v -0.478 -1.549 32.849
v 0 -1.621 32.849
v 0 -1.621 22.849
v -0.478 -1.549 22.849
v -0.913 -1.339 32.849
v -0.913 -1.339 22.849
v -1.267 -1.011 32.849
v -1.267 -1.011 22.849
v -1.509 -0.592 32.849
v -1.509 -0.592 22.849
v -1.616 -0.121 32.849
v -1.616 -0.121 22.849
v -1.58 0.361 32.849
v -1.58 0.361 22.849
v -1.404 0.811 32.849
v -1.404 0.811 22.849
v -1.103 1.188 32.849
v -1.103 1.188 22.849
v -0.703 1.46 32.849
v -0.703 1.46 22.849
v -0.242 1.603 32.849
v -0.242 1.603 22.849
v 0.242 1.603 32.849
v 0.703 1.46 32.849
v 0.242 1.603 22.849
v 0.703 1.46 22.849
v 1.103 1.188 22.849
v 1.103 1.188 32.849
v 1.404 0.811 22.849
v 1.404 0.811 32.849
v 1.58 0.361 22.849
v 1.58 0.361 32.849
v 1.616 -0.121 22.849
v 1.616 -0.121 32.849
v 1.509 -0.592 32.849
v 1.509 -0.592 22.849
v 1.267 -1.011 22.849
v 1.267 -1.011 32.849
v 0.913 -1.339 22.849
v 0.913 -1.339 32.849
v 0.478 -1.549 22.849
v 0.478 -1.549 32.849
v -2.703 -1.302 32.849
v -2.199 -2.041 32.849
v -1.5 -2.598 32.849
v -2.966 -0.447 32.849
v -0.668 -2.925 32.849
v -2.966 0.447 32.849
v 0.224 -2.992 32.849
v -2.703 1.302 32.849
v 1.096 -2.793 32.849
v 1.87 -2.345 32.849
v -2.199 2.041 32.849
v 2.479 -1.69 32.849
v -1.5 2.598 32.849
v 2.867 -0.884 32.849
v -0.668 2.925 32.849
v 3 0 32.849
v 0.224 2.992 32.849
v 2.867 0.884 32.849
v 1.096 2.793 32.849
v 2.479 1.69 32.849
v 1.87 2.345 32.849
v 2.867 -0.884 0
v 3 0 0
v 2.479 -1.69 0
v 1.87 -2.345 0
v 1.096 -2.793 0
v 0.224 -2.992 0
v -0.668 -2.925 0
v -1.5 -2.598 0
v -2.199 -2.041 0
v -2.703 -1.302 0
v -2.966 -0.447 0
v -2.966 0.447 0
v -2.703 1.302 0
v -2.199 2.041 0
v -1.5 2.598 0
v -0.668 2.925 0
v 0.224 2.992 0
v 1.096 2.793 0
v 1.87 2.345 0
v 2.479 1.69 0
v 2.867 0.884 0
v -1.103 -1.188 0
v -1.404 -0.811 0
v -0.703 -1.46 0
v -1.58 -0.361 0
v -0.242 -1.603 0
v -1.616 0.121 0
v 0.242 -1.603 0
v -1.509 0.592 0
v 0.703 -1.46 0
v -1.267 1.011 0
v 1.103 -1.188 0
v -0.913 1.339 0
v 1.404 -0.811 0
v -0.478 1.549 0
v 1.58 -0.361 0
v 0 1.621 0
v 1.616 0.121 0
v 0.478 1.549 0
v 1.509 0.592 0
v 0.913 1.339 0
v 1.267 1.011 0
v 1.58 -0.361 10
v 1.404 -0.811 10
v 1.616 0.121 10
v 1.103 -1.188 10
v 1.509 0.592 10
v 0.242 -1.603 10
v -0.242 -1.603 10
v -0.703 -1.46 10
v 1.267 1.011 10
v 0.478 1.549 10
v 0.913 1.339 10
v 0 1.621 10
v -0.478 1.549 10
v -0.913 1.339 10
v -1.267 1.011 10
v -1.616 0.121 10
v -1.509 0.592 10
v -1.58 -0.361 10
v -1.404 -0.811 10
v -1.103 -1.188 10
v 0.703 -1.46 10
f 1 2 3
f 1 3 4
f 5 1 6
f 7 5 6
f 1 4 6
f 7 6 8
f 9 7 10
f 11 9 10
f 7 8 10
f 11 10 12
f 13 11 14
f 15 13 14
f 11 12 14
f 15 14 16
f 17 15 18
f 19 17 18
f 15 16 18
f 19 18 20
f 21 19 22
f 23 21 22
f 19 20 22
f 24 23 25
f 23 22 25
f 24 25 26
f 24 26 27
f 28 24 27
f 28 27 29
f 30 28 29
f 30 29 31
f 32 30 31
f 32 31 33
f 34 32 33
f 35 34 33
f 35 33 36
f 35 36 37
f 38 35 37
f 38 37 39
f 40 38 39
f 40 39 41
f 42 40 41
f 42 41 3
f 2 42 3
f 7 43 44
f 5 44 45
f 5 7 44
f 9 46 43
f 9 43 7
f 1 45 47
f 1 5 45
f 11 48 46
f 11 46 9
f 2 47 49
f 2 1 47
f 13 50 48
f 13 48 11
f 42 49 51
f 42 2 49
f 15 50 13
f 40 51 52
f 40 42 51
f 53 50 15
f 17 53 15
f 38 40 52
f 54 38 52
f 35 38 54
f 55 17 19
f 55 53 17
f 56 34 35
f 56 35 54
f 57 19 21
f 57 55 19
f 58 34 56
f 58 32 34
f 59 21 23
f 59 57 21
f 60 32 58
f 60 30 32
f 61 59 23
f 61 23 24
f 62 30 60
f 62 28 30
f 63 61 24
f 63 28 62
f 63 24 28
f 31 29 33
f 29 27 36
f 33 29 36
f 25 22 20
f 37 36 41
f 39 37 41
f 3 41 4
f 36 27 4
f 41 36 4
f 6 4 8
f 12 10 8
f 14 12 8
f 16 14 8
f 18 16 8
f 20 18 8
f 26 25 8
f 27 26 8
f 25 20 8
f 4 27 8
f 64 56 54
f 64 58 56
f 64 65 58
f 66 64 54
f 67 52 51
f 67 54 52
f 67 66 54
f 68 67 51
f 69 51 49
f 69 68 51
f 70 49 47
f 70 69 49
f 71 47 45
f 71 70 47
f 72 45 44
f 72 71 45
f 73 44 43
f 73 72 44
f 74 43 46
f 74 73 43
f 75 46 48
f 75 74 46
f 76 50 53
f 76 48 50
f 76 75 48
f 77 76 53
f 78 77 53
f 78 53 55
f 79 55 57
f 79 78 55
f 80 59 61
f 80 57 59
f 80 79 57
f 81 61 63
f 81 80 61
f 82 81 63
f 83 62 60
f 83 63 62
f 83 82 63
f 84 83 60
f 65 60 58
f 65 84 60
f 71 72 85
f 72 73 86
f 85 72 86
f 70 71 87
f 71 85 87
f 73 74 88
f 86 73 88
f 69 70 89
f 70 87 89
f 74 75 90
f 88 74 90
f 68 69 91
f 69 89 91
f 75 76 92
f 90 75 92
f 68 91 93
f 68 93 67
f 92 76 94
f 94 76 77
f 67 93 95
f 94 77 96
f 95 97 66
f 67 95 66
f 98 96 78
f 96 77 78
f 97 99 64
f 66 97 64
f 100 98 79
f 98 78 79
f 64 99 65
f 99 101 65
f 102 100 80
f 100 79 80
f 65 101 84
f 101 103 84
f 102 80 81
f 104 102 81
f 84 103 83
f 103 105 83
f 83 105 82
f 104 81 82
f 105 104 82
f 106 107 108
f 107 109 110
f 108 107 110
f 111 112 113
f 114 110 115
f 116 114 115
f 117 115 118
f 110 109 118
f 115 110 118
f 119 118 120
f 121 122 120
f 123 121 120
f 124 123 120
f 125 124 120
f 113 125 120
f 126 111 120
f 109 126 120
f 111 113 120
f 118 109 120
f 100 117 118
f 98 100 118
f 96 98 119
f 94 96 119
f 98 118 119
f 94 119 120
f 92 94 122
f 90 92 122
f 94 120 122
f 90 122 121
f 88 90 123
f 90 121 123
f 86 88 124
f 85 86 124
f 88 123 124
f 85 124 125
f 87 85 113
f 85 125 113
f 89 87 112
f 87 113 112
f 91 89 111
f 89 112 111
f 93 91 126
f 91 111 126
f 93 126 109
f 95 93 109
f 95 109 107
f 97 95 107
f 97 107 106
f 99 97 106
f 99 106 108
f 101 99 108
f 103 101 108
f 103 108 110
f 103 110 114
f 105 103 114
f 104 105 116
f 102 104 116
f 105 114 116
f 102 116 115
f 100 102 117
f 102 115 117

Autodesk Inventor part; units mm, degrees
ref_plane "YZ Plane" through (0, 0, 0) normal (1, 0, 0) x (0, 1, 0)
sketch "Sketch2" plane through (0, 0, 0) normal (0, 0, 1) x (1, 0, 0)
  circle A0 centre (0, 0) radius 3
  dimension "d0" = 6
ref_plane "Work Plane1" through (-3.0381, -3.0381, 30.2492) normal (0, 0, -1) x (0, 1, 0)
ref_plane "Work Plane2" through (-3.0898, -3.0898, 32.8492) normal (0, 0, -1) x (0.0301, 0.9995, 0)
extrude "Extrusion1" add sketch "Sketch2" along normal up to surface (32.8492 mm away)
sketch "Sketch3" plane through (0, 0, 32.8492) normal (0, 0, 1) x (1, 0, 0)
  point P0 (0, 0)
  point P1 (0, 0)
hole "Hole1" at (0, 0, 32.8492) direction (0, 0, -1) diameter 3.242 depth 10 thread size "M4x0.7" class "6H" standard "ISO Metric profile"
sketch "Sketch4" plane through (0, 0, 0) normal (0, 0, -1) x (-1, 0, 0)
  circle A0 centre (0, 0) radius 1.621 projected
  point P0 (0, 0)
hole "Hole2" at (0, 0, 0) direction (0, 0, 1) diameter 3.242 depth 10 thread size "M4x0.7" class "6H" standard "ISO Metric profile"
properties part number "GEARBOX STANDOFFS"
